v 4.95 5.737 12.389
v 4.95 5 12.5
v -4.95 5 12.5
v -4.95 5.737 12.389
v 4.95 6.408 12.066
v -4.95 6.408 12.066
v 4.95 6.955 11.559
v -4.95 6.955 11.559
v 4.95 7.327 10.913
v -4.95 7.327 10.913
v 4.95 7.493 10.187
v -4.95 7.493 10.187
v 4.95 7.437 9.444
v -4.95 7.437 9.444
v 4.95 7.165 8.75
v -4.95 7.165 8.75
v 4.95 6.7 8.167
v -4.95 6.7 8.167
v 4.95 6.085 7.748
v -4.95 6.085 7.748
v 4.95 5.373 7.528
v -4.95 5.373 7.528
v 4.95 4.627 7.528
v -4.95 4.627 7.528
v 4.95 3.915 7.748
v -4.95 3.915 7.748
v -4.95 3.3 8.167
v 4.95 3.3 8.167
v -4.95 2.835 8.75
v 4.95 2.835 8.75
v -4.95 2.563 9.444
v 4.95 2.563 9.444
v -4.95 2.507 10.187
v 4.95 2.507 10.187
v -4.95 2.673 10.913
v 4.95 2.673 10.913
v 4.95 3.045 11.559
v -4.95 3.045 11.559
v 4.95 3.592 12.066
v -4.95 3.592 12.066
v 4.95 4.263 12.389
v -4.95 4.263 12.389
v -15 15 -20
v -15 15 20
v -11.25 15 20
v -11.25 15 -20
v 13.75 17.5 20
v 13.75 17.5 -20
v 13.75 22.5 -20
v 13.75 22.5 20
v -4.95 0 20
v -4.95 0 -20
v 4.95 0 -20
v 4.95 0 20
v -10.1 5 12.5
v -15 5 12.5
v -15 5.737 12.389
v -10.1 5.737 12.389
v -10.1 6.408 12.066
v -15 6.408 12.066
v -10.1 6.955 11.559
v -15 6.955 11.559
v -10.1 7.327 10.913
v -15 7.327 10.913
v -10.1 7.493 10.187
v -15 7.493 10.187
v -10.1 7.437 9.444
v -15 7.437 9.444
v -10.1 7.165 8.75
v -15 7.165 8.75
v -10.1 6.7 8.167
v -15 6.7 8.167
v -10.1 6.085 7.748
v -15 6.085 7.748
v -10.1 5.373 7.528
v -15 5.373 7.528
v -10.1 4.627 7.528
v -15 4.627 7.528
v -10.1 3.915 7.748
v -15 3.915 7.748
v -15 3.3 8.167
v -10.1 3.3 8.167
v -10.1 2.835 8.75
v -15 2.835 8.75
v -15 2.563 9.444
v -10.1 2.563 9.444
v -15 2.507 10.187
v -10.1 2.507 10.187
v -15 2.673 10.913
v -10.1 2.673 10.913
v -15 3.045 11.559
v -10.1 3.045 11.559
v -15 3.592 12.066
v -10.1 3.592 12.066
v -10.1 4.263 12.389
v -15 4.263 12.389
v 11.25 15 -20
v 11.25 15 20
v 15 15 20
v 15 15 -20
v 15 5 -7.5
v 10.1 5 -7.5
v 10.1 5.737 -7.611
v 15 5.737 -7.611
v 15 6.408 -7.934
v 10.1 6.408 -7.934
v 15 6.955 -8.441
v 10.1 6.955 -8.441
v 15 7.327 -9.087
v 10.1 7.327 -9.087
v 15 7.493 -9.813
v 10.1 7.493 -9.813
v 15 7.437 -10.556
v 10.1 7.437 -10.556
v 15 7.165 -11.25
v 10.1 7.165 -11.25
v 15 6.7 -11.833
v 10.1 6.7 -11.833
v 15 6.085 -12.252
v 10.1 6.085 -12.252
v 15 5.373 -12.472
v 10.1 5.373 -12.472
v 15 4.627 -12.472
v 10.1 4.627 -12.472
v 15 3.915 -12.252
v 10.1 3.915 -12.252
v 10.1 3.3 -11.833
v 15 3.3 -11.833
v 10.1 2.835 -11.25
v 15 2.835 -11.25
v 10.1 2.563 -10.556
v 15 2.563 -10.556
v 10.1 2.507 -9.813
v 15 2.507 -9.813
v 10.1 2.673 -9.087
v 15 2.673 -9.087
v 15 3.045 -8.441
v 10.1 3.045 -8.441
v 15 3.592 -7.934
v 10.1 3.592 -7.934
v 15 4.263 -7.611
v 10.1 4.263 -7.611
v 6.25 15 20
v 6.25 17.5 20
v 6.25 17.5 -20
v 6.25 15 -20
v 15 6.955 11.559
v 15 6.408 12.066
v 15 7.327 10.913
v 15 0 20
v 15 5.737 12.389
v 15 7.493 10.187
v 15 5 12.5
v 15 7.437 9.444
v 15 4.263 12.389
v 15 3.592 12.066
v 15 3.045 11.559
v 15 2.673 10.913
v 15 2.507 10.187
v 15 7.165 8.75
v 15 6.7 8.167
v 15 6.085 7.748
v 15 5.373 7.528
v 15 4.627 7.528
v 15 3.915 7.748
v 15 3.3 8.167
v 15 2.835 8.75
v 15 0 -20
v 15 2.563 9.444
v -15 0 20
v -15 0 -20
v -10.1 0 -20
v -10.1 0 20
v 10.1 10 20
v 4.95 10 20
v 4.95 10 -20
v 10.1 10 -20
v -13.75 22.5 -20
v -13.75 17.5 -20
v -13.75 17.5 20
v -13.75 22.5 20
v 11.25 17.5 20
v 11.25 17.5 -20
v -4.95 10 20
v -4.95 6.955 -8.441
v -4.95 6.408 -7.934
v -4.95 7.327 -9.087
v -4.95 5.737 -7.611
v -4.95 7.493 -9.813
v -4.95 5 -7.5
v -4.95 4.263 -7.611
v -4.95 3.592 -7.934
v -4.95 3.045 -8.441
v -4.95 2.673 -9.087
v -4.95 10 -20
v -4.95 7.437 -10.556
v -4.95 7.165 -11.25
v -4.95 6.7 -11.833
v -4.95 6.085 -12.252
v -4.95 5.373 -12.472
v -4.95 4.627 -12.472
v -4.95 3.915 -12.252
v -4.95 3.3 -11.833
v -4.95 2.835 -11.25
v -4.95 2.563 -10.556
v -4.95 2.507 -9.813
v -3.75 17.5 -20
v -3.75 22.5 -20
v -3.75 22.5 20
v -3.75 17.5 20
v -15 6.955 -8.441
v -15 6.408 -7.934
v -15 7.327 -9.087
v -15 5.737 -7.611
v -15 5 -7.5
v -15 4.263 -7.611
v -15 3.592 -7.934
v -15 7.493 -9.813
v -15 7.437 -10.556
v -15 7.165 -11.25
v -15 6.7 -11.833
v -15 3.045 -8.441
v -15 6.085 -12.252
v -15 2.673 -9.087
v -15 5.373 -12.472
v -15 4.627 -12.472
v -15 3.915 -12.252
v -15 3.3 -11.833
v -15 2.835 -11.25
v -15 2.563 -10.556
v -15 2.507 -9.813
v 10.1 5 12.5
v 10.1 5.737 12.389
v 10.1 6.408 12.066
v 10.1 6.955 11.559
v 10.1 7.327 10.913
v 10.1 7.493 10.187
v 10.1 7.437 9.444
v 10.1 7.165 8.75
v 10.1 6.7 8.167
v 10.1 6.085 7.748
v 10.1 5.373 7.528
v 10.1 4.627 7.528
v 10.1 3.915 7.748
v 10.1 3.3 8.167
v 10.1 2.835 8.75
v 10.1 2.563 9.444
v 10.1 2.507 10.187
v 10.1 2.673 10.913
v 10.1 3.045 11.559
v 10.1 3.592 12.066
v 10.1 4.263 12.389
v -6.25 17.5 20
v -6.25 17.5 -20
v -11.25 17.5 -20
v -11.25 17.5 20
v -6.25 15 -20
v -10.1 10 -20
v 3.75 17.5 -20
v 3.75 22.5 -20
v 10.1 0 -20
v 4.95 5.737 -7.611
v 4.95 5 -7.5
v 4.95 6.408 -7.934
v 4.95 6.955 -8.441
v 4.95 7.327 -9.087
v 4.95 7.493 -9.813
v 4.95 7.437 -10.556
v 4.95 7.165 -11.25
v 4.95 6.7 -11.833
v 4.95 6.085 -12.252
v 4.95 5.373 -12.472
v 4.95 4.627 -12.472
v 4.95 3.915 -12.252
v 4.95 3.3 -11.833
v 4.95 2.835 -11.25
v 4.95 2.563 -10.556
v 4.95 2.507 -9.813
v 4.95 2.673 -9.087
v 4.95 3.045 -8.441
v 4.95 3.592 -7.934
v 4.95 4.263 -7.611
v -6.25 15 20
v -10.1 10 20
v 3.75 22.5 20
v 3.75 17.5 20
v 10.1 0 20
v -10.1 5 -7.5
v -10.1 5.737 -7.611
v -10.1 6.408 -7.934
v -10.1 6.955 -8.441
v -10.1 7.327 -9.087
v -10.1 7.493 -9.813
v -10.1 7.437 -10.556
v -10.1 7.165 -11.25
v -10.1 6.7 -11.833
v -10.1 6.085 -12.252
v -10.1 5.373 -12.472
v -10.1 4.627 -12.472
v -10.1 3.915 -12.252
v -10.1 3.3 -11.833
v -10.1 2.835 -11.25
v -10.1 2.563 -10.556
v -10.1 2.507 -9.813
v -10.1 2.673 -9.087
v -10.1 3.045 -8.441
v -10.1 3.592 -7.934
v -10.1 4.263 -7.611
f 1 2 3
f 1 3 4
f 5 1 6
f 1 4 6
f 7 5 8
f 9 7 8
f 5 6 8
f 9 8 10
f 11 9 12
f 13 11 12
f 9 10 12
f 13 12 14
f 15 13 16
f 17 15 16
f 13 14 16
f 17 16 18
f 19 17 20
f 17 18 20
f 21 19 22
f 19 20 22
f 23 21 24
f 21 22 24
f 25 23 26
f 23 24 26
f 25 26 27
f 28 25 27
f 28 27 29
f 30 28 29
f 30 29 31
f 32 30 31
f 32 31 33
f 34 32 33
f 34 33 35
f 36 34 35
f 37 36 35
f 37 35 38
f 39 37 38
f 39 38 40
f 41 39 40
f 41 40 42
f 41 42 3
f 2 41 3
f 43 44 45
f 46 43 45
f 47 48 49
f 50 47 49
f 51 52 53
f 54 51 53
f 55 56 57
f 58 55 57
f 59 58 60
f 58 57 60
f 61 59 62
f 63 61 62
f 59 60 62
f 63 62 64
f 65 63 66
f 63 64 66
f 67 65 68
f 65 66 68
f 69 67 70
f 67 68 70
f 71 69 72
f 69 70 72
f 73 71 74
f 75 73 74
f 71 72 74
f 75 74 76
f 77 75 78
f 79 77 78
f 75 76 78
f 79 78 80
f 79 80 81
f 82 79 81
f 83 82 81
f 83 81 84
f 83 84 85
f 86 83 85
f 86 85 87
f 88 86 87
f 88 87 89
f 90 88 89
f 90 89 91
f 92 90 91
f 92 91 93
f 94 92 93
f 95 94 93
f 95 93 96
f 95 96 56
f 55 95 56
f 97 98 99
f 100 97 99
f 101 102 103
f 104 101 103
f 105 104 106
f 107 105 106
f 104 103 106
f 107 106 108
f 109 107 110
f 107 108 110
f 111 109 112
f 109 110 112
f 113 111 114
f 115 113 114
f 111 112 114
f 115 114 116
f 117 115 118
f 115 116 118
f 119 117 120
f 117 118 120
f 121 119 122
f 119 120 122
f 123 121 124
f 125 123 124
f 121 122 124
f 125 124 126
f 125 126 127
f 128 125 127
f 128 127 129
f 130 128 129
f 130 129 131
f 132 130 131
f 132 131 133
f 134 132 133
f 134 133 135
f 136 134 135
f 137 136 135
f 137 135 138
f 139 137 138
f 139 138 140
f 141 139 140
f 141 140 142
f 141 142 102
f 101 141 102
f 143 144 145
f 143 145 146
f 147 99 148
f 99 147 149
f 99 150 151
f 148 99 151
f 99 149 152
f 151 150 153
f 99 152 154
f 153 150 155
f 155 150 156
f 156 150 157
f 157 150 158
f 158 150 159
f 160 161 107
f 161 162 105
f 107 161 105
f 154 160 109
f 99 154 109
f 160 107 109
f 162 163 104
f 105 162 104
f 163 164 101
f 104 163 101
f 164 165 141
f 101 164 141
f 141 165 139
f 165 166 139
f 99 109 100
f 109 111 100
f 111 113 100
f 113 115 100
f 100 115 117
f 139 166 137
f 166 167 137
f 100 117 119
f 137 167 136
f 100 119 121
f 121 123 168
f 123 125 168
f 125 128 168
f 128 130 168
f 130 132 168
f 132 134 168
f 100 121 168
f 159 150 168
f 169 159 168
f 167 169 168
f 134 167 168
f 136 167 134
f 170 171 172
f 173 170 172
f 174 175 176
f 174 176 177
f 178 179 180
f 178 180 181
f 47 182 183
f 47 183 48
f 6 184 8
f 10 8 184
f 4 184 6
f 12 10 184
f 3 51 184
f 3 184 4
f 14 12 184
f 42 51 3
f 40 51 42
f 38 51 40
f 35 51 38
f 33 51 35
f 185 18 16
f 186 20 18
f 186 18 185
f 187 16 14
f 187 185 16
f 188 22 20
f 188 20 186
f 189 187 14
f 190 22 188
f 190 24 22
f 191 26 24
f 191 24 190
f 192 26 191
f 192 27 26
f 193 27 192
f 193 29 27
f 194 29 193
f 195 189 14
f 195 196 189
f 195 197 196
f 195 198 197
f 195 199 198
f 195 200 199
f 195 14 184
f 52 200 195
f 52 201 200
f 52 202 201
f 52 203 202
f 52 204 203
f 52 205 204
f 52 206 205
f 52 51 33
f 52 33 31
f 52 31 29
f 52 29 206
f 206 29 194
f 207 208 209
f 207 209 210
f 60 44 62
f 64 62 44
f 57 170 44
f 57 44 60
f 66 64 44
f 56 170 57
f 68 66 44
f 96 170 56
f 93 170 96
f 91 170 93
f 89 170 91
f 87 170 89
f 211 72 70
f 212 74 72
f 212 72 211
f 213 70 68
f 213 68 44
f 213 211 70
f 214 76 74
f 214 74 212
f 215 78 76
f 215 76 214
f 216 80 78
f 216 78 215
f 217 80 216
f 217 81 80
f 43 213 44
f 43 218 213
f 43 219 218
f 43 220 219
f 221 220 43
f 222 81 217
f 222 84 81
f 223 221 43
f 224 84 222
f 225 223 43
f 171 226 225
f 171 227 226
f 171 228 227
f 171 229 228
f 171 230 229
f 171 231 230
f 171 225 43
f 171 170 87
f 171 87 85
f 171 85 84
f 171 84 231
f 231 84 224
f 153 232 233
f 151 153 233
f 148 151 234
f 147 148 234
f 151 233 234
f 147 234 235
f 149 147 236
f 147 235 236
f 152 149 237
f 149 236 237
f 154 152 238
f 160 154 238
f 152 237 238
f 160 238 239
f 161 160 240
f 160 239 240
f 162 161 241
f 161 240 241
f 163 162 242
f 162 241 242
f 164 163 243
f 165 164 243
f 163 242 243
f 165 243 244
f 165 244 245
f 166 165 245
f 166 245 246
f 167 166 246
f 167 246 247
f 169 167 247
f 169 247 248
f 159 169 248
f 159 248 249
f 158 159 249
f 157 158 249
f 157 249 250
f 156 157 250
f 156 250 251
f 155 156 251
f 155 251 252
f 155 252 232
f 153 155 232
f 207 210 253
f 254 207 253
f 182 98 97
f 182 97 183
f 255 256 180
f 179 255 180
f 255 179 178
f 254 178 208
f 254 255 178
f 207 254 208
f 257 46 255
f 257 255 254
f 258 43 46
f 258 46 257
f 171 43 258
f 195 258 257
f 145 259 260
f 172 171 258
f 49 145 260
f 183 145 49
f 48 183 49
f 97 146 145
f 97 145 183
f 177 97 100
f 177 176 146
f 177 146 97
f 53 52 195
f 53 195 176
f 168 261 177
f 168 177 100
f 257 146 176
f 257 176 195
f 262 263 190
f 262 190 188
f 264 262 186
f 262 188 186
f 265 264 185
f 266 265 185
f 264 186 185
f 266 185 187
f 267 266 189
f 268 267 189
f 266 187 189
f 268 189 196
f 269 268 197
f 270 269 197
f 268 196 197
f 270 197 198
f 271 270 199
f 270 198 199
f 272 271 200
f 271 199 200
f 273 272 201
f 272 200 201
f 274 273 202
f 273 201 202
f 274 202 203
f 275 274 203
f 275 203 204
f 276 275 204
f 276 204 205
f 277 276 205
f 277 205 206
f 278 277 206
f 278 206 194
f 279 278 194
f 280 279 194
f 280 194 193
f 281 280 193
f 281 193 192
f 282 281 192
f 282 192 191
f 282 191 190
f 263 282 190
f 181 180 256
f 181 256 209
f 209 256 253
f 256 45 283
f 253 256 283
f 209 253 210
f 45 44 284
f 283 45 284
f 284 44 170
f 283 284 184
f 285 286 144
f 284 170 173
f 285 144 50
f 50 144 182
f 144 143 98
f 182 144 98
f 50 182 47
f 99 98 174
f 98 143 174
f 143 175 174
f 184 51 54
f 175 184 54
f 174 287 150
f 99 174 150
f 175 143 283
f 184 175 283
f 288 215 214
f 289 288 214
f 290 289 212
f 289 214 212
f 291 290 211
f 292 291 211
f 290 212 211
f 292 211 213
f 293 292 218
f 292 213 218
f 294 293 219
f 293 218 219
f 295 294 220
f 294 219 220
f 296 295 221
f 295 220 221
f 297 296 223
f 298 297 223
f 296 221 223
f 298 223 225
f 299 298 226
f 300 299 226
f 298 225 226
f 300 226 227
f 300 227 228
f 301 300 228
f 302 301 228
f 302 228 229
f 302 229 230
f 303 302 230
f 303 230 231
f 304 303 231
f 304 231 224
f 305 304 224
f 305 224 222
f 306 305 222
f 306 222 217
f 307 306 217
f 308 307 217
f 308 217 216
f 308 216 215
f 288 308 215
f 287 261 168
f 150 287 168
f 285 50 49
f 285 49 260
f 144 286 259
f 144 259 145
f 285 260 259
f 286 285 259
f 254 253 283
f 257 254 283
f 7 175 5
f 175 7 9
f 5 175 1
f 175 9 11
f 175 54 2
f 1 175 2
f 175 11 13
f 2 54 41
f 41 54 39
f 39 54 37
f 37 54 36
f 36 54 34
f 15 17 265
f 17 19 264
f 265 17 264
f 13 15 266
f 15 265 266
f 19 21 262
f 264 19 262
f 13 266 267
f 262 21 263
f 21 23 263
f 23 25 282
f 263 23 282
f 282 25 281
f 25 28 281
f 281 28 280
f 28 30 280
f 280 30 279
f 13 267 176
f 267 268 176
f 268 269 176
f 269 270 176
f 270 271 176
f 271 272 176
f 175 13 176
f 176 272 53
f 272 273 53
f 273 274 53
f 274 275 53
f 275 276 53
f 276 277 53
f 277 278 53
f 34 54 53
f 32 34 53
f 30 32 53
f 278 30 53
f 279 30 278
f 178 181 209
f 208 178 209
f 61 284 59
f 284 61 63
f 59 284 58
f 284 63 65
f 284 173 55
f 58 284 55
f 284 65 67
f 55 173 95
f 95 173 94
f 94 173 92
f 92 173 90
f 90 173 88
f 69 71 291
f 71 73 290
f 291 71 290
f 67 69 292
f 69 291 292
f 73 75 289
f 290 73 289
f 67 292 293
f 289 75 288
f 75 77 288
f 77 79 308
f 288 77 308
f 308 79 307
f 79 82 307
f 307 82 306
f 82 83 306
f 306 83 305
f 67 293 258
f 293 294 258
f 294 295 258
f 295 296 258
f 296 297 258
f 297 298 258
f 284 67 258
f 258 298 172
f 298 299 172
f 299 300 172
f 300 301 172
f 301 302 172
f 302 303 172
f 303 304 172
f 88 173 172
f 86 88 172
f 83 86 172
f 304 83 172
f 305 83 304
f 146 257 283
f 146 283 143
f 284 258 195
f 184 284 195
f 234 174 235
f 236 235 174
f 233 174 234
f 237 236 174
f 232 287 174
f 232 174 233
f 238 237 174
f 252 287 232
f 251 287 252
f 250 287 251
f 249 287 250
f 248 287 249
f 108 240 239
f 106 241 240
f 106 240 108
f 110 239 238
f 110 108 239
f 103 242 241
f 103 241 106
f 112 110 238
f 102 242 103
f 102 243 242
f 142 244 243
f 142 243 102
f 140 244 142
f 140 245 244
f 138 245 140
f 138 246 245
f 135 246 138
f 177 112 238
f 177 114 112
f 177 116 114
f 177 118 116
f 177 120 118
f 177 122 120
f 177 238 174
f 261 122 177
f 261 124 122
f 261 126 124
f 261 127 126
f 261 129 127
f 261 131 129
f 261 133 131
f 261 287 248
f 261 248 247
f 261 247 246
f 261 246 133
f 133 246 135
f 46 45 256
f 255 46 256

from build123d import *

# Parameters (mm, degrees)
SKETCH2_W             = 9.9
SKETCH2_H             = 40
BOSS_EXTRUDE1_DEPTH   = 10
SKETCH2_W_2           = 4.9
BOSS_EXTRUDE1_2_DEPTH = 10
BOSS_EXTRUDE1_3_DEPTH = 10
SKETCH3_R             = 2.5
CUT_EXTRUDE1_DEPTH    = 30
SKETCH4_W             = 30
SKETCH4_H             = 40
BOSS_EXTRUDE2_DEPTH   = 5
BOSS_EXTRUDE3_DEPTH   = 40


with BuildPart() as part:
    # Sketch2 → Boss-Extrude1 (new body)
    with BuildSketch(Plane(origin=(0, 0, 0), x_dir=(1, 0, 0), z_dir=(0, 1, 0))):
        Rectangle(SKETCH2_W, SKETCH2_H)
    extrude(amount=BOSS_EXTRUDE1_DEPTH)


with BuildPart() as body_2:
    # Sketch2 → Boss-Extrude1 2 (new body)
    with BuildSketch(Plane(origin=(0, 0, 0), x_dir=(1, 0, 0), z_dir=(0, 1, 0))):
        with Locations((-12.55, 0)):
            Rectangle(SKETCH2_W_2, SKETCH2_H)
    extrude(amount=BOSS_EXTRUDE1_2_DEPTH)


with BuildPart() as body_3:
    # Sketch2 → Boss-Extrude1 3 (new body)
    with BuildSketch(Plane(origin=(0, 0, 0), x_dir=(1, 0, 0), z_dir=(0, 1, 0))):
        with Locations((12.55, 0)):
            Rectangle(SKETCH2_W_2, SKETCH2_H)
    extrude(amount=BOSS_EXTRUDE1_3_DEPTH)


with BuildPart() as cut_extrude1_tool:
    # Sketch3 → Cut-Extrude1 (new body)
    with BuildSketch(Plane.ZY.offset(15)):
        with Locations((-10, 5)):
            Circle(SKETCH3_R)
        with Locations((10, 5)):
            Circle(SKETCH3_R)
    extrude(amount=-CUT_EXTRUDE1_DEPTH)


with BuildPart() as part_1:
    add(part.part)

    # Cut-Extrude1: cut by cut_extrude1_tool
    add(cut_extrude1_tool.part, mode=Mode.SUBTRACT)



with BuildPart() as body_2_1:
    add(body_2.part)

    # Cut-Extrude1: cut by cut_extrude1_tool
    add(cut_extrude1_tool.part, mode=Mode.SUBTRACT)


with BuildPart() as body_3_1:
    add(body_3.part)

    # Cut-Extrude1: cut by cut_extrude1_tool
    add(cut_extrude1_tool.part, mode=Mode.SUBTRACT)


with BuildPart() as part_2:
    add(part_1.part)

    add(body_2_1.part)  # Boss-Extrude2 merges body 2

    add(body_3_1.part)  # Boss-Extrude2 merges body 3
    # Sketch4 → Boss-Extrude2 (add)
    with BuildSketch(Plane(origin=(0, 10, 0), x_dir=(1, 0, 0), z_dir=(0, 1, 0))):
        Rectangle(SKETCH4_W, SKETCH4_H)
    extrude(amount=BOSS_EXTRUDE2_DEPTH)

    # Sketch5 → Boss-Extrude3 (add)
    with BuildSketch(Plane.XY.offset(20)):
        Polygon((-11.25, 15), (-11.25, 17.5), (-13.75, 17.5), (-13.75, 22.5), (-3.75, 22.5), (-3.75, 17.5), (-6.25, 17.5), (-6.25, 15), align=None)
    boss_extrude3 = extrude(amount=-BOSS_EXTRUDE3_DEPTH)

    # Mirror1: Boss-Extrude3 across Right Plane
    add(boss_extrude3.mirror(Plane(origin=(0, 0, 0), x_dir=(0, 0, -1), z_dir=(1, 0, 0))))


solid = part_2.part
